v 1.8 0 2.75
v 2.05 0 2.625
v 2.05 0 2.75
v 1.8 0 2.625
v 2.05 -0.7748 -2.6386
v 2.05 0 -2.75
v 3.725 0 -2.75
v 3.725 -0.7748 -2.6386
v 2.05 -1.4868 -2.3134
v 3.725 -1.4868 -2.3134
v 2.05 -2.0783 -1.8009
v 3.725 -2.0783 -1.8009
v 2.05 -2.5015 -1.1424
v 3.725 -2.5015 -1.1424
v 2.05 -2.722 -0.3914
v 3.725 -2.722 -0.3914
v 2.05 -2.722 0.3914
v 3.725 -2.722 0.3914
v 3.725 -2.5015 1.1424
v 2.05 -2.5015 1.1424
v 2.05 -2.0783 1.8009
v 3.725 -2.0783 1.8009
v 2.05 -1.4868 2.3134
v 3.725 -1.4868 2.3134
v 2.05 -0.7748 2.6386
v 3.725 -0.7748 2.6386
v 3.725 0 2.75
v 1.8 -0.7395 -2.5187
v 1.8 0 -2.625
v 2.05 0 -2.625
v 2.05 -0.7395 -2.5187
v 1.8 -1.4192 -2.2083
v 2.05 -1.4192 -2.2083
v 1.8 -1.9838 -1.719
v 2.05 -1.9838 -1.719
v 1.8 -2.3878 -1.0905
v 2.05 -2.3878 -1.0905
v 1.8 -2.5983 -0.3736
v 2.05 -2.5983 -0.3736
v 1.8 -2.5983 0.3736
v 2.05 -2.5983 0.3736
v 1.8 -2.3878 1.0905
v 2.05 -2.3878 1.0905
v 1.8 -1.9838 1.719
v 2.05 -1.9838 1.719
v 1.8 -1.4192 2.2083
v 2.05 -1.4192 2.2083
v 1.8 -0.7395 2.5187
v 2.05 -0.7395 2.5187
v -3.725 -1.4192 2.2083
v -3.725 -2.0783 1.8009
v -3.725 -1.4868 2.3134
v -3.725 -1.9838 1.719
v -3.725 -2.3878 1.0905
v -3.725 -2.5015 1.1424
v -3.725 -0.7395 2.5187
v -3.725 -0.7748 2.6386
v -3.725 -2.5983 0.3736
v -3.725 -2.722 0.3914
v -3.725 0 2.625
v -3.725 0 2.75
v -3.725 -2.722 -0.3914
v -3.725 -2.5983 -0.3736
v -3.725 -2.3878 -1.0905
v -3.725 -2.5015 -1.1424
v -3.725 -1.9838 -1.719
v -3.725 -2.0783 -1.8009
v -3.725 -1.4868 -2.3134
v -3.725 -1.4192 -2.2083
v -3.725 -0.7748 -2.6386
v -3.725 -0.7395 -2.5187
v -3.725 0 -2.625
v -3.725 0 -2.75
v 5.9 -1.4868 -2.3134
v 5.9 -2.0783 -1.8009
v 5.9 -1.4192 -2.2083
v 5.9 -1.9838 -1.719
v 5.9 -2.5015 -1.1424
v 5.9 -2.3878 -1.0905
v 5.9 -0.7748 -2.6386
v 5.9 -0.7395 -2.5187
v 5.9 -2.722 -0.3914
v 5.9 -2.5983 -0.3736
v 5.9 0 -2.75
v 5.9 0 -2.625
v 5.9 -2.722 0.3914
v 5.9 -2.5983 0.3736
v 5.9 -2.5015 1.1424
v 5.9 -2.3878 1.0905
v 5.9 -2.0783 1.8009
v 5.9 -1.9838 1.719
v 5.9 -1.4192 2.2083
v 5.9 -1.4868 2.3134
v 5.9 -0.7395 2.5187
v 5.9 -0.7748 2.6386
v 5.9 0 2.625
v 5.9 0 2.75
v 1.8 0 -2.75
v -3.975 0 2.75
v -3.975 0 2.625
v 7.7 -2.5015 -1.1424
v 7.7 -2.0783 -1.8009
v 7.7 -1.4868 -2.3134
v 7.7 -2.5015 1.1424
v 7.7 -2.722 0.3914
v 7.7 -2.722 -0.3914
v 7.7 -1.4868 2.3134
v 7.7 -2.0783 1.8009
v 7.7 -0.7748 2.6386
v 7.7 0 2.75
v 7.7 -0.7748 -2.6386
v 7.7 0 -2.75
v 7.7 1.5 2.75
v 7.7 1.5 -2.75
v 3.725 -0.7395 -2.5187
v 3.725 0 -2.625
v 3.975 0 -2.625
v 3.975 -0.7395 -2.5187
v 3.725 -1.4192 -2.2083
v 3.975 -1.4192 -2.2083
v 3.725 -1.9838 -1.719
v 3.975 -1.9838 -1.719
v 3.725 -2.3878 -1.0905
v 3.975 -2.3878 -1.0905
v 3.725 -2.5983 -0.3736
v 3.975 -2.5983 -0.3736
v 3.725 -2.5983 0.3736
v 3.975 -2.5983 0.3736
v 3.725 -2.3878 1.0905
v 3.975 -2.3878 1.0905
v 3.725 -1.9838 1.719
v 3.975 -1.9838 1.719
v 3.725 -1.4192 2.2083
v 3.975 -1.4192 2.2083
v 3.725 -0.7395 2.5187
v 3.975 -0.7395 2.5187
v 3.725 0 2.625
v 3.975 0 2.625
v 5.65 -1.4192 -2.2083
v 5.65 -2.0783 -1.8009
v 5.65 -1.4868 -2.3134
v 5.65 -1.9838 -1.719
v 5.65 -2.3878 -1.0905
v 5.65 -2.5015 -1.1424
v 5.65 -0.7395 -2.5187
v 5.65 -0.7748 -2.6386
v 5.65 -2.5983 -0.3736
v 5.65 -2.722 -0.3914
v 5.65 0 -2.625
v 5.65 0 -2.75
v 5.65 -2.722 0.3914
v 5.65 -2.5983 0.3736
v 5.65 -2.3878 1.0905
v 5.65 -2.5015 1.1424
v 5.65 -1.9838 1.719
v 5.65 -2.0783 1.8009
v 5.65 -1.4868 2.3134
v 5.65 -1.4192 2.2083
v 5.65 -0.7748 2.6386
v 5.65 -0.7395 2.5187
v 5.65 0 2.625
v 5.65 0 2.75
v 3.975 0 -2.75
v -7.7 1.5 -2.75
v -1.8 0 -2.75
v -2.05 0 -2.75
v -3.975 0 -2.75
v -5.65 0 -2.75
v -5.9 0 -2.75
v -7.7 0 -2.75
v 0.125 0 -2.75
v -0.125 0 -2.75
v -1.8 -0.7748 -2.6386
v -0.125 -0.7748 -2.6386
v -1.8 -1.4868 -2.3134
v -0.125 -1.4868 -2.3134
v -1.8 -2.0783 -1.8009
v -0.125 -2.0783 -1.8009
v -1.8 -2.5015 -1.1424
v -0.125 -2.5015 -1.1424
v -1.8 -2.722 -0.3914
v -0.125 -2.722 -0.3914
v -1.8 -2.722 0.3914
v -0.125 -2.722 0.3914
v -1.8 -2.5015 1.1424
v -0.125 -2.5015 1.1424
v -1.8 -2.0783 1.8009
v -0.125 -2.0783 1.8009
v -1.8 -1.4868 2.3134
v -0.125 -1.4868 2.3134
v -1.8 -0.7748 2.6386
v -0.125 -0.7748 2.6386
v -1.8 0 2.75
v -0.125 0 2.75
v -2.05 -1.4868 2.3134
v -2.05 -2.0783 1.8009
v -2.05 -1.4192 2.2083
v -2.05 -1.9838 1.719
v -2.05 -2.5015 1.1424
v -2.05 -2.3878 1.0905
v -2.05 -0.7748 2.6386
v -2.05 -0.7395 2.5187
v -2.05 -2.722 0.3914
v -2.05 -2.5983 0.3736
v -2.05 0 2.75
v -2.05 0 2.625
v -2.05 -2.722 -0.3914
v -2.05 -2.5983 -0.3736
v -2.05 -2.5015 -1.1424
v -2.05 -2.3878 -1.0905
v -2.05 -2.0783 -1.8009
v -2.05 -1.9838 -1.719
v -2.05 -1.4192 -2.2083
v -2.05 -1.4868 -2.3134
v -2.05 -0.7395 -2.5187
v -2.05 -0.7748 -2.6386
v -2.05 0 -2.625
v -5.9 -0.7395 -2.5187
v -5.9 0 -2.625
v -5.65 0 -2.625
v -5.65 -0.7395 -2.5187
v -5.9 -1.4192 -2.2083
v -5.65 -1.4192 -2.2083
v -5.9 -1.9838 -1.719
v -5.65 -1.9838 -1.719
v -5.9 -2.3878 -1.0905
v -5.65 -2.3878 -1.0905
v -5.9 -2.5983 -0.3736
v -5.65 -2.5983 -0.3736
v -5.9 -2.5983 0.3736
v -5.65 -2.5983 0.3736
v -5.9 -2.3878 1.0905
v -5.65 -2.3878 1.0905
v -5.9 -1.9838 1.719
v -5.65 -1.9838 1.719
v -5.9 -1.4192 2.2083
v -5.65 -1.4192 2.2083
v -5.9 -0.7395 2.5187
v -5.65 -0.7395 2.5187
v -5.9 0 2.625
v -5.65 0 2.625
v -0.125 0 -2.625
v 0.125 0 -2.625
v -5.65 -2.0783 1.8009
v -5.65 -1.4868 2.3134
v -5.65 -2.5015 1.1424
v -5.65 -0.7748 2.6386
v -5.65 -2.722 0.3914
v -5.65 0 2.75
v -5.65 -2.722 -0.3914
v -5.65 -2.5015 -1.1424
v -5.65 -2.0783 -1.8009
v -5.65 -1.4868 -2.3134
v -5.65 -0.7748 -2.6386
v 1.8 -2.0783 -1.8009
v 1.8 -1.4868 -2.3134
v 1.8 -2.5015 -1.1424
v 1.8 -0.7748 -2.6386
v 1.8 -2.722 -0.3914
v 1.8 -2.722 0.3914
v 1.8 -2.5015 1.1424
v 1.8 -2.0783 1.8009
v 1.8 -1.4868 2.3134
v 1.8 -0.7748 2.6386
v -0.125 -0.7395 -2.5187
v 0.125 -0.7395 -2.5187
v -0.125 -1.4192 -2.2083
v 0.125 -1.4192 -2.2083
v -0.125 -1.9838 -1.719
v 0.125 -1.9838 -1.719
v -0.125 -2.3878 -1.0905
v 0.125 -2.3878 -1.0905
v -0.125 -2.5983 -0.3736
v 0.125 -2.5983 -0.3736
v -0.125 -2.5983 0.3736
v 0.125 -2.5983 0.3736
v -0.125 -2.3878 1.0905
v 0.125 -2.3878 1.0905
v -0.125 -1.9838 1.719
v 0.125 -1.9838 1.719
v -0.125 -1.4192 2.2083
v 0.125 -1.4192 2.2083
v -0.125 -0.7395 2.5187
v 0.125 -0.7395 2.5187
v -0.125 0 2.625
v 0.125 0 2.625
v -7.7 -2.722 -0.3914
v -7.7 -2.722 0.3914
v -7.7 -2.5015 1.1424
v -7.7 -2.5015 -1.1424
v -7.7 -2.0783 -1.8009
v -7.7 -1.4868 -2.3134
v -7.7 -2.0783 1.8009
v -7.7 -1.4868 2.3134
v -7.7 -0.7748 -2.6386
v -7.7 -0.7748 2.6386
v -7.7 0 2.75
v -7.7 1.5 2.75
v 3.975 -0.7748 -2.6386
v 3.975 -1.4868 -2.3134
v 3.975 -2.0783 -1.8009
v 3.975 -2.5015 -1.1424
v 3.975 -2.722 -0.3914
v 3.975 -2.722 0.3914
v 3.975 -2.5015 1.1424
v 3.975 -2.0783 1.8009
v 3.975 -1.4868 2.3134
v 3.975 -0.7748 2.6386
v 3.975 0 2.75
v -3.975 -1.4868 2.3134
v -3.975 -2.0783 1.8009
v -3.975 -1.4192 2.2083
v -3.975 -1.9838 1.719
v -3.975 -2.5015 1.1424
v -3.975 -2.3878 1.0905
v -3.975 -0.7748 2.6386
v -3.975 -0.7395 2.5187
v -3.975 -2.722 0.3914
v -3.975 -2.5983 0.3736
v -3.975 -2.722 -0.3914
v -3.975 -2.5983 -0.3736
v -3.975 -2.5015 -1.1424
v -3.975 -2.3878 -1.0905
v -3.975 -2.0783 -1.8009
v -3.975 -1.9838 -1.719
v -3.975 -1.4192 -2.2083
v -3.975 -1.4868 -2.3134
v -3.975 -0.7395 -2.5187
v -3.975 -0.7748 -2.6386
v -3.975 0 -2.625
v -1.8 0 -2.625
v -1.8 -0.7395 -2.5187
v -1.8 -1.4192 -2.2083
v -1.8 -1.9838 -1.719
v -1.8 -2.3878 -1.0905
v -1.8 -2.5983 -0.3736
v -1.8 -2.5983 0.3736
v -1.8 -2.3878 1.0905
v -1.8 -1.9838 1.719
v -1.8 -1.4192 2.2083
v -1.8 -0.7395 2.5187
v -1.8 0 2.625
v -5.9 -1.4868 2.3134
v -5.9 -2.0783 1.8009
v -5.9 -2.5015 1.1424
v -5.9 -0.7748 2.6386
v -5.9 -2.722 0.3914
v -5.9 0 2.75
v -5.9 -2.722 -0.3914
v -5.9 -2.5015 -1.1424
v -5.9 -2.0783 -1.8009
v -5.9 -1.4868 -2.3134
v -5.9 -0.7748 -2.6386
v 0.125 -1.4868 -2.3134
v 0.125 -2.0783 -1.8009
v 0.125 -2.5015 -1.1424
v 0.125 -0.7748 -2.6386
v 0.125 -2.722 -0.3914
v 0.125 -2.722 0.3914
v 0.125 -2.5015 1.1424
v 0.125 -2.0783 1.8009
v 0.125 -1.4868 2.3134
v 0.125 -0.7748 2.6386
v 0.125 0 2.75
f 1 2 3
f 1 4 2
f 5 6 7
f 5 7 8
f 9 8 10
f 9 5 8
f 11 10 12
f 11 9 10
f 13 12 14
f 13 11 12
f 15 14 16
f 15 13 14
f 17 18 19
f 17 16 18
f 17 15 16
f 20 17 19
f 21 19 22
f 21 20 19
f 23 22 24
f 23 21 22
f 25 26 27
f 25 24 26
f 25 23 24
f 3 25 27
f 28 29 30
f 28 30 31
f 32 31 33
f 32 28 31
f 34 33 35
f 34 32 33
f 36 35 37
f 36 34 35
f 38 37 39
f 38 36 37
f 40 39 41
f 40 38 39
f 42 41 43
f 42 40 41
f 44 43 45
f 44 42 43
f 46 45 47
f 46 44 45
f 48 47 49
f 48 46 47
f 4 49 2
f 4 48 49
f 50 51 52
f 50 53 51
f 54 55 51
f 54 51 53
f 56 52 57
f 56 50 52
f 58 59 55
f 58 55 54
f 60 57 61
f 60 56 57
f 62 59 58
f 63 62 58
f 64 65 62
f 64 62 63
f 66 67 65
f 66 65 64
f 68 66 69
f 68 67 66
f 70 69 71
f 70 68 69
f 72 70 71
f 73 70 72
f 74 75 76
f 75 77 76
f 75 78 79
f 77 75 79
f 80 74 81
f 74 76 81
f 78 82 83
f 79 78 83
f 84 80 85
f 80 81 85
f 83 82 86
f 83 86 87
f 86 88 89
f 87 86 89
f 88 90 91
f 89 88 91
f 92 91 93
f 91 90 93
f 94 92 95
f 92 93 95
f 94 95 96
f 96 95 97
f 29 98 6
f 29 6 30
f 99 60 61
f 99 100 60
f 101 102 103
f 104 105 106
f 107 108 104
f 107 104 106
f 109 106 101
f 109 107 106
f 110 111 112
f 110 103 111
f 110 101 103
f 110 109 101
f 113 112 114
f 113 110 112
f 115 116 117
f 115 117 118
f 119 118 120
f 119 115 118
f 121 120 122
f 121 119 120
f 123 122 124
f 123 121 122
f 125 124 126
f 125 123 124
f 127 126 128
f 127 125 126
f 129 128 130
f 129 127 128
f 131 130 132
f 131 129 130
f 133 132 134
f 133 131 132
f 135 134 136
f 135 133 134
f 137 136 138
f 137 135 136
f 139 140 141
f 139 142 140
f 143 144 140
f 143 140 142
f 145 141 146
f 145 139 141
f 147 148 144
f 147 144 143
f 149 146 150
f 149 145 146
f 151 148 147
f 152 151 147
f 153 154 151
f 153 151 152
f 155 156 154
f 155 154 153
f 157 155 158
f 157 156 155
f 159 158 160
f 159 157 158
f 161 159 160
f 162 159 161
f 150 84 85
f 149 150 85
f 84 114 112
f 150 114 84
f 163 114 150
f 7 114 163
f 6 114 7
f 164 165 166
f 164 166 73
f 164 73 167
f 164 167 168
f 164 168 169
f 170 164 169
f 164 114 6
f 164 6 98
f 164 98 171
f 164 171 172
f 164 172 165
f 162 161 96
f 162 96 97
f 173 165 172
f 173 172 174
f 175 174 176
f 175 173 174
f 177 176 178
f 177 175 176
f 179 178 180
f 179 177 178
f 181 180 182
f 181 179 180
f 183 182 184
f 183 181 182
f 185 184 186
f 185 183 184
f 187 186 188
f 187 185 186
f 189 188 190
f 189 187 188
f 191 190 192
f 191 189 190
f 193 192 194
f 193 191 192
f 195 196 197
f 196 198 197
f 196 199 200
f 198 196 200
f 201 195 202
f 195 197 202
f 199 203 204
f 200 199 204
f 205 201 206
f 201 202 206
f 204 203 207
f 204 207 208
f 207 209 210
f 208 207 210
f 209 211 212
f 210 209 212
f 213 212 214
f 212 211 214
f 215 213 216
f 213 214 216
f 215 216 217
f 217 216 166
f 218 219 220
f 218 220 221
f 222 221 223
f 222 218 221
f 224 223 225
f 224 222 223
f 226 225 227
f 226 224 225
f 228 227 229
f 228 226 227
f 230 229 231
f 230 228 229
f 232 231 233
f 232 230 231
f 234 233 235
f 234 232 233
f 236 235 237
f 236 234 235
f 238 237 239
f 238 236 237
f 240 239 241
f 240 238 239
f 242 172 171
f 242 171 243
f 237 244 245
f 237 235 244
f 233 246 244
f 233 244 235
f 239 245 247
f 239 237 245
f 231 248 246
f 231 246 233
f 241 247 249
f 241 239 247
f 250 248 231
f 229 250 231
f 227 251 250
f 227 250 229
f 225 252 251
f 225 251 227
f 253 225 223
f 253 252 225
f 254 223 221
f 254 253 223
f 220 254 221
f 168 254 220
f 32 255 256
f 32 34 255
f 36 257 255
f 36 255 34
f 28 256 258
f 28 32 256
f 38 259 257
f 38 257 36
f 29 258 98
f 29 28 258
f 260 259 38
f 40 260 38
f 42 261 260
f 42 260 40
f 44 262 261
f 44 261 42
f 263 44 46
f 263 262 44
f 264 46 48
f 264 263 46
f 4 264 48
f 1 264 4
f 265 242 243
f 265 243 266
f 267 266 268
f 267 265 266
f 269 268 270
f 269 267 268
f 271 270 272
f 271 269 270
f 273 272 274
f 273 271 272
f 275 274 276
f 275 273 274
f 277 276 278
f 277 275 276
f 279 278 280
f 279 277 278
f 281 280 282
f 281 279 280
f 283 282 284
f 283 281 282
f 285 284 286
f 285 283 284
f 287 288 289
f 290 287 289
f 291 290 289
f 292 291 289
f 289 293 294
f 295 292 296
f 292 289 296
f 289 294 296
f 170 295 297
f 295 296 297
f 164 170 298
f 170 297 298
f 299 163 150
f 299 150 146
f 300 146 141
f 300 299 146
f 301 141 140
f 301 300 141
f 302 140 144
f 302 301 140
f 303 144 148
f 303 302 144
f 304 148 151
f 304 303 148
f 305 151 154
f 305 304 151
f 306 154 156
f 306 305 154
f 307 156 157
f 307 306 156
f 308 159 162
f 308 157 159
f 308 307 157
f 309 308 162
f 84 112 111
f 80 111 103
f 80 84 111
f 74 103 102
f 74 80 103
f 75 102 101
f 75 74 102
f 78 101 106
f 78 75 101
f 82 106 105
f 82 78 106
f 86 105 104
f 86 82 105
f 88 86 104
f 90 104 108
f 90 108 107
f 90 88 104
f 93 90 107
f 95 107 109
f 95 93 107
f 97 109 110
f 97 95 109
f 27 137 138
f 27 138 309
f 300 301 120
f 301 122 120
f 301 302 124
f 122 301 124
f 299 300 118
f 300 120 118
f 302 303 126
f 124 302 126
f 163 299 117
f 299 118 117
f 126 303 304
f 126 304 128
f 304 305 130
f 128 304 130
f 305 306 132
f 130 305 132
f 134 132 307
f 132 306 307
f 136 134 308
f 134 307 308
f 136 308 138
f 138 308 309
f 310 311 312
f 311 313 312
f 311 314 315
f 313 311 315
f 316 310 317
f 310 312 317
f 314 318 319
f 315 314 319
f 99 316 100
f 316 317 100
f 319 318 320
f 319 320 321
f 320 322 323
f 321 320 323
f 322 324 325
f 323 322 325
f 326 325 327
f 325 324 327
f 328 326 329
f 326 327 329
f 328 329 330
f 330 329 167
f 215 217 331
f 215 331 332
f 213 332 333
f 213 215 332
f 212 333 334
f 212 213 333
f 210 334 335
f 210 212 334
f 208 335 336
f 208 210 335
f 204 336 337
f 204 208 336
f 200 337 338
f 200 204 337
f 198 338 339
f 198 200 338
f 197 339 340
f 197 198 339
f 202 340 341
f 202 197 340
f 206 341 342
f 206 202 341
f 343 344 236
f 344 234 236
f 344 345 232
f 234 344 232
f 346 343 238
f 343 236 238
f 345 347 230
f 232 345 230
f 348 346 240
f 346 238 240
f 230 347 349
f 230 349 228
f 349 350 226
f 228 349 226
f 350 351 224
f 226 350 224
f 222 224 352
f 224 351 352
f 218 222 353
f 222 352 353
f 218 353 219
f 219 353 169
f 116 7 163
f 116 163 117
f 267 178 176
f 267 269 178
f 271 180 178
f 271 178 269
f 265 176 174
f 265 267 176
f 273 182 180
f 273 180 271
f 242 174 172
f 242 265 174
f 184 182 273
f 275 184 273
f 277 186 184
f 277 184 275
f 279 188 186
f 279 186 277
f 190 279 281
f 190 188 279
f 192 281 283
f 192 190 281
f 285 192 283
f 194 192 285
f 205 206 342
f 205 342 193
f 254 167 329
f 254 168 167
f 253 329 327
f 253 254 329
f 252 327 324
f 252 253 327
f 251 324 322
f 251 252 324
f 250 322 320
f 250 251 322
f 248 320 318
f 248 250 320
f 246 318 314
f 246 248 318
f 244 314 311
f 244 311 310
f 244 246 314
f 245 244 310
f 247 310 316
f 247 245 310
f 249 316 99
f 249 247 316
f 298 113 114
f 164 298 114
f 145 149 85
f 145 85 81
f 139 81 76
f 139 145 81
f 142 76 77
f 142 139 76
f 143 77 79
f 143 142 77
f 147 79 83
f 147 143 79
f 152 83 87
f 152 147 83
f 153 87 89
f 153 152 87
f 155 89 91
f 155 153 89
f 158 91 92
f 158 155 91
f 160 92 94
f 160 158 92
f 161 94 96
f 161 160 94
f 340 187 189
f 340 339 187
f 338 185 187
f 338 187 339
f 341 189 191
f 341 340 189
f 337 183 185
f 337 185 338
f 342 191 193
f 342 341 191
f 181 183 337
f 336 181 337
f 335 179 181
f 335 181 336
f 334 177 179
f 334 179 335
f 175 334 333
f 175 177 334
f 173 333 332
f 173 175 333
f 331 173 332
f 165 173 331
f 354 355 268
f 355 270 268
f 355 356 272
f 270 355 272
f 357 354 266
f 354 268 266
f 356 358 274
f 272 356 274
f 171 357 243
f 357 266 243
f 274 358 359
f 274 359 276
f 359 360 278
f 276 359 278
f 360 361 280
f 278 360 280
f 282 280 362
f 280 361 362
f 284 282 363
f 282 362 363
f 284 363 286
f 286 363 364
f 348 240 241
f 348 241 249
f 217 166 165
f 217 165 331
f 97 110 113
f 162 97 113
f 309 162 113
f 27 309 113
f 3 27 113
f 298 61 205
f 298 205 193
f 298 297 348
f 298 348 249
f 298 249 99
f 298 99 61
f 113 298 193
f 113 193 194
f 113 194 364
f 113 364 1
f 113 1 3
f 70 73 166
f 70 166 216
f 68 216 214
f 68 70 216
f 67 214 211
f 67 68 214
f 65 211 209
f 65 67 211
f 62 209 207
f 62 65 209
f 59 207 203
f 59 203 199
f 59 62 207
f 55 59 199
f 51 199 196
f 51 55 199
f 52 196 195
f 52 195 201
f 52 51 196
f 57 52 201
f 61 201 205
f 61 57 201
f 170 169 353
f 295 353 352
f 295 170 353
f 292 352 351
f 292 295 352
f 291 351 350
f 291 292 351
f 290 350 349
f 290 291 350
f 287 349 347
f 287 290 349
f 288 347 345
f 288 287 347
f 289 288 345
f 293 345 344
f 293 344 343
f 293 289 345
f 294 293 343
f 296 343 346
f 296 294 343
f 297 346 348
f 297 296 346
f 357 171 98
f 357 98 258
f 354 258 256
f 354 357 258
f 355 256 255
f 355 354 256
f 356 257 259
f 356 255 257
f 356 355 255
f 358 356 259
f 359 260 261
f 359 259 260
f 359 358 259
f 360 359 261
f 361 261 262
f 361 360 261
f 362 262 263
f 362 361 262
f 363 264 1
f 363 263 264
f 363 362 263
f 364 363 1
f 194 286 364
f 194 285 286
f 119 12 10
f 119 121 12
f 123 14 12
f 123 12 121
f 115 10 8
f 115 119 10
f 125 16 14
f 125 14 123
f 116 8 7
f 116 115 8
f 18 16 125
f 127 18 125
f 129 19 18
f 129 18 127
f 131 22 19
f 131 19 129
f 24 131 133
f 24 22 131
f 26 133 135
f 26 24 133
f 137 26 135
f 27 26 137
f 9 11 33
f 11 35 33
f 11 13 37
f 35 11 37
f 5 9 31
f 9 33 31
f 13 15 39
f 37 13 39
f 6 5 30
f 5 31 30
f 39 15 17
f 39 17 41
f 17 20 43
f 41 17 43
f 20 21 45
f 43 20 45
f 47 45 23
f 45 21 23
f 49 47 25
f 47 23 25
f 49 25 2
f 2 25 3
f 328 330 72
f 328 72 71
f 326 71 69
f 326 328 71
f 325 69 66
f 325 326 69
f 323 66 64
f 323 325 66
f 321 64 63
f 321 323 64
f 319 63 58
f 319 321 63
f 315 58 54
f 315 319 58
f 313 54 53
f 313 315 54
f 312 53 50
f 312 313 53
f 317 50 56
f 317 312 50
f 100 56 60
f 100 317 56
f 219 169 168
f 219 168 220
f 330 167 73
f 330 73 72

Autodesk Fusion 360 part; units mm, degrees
sketch "Sketch1" plane through (0, 0, 0) normal (1, 0, 0) x (0, 1, 0)
  circle A0 centre (0, 0) radius 2.75
  line L0 (0, 0) -> (0, 2.75) construction
  line L1 (0, 0) -> (0, -2.75) construction
  line L2 (0, 2.75) -> (1.5, 2.75)
  line L3 (1.5, 2.75) -> (1.5, -2.75)
  line L4 (1.5, -2.75) -> (0, -2.75)
  line L5 (0, -2.75) -> (0, 2.75)
  dimension "d1" = 5.5
  dimension "d42" = 1.5
extrude "Extrude1" add sketch "Sketch1" along normal mid plane 15.4 contours A0 L5 | A0 L3 L5 | A0 L3
ref_plane "WorkPlane1" through (-7.5, 0, 0) normal (-1, 0, 0) x (0, -1, 0)
ref_plane "WorkPlane2" through (0, 0, 0) normal (1, 0, 0) x (0, 1, 0)
ref_plane "WorkPlane3" through (3.85, 0, 0) normal (1, 0, 0) x (0, 1, 0)
ref_plane "WorkPlane4" through (5.775, 0, 0) normal (1, 0, 0) x (0, 1, 0)
ref_plane "WorkPlane5" through (1.925, 0, 0) normal (1, 0, 0) x (0, 1, 0)
ref_plane "WorkPlane6" through (-3.85, 0, 0) normal (-1, 0, 0) x (0, -1, 0)
ref_plane "WorkPlane7" through (-5.775, 0, 0) normal (-1, 0, 0) x (0, -1, 0)
ref_plane "WorkPlane8" through (-1.925, 0, 0) normal (-1, 0, 0) x (0, -1, 0)
sketch "Sketch3" plane through (0, 0, 0) normal (1, 0, 0) x (0, 1, 0)
  circle A0 centre (0, 0) radius 2.75
  circle A1 centre (0, 0) radius 2.625
  dimension "d12" = 5.5
  dimension "d13" = 5.25
extrude "Extrude2" cut sketch "Sketch3" along normal mid plane 0.25
sketch "Sketch4" plane through (-7.5, 0, 0) normal (-1, 0, 0) x (0, 1, 0)
  circle A0 centre (0, 0) radius 2.75
  circle A1 centre (0, 0) radius 2.625
  dimension "d16" = 5.5
  dimension "d17" = 5.25
sketch "Sketch5" plane through (-1.925, 0, 0) normal (-1, 0, 0) x (0, 1, 0)
  circle A0 centre (0, 0) radius 2.75
  circle A1 centre (0, 0) radius 2.625
  dimension "d18" = 5.5
  dimension "d19" = 5.25
extrude "Extrude3" cut sketch "Sketch5" along normal mid plane 0.25
sketch "Sketch6" plane through (-3.85, 0, 0) normal (-1, 0, 0) x (0, 1, 0)
  circle A0 centre (0, 0) radius 2.75
  circle A1 centre (0, 0) radius 2.625
  dimension "d22" = 5.5
  dimension "d23" = 5.25
extrude "Extrude4" cut sketch "Sketch6" along normal mid plane 0.25
sketch "Sketch7" plane through (-5.775, 0, 0) normal (-1, 0, 0) x (0, 1, 0)
  circle A0 centre (0, 0) radius 2.75
  circle A1 centre (0, 0) radius 2.625
  dimension "d26" = 5.5
  dimension "d27" = 5.25
extrude "Extrude5" cut sketch "Sketch7" along normal mid plane 0.25
sketch "Sketch8" plane through (1.925, 0, 0) normal (1, 0, 0) x (0, 1, 0)
  circle A0 centre (0, 0) radius 2.75
  circle A1 centre (0, 0) radius 2.625
  dimension "d30" = 5.5
  dimension "d31" = 5.25
extrude "Extrude6" cut sketch "Sketch8" along normal mid plane 0.25
sketch "Sketch9" plane through (3.85, 0, 0) normal (1, 0, 0) x (0, 1, 0)
  circle A0 centre (0, 0) radius 2.75
  circle A1 centre (0, 0) radius 2.625
  dimension "d34" = 5.5
  dimension "d35" = 5.25
extrude "Extrude7" cut sketch "Sketch9" along normal mid plane 0.25
sketch "Sketch10" plane through (5.775, 0, 0) normal (1, 0, 0) x (0, 1, 0)
  circle A0 centre (0, 0) radius 2.75
  circle A1 centre (0, 0) radius 2.625
  dimension "d38" = 5.5
  dimension "d39" = 5.25
extrude "Extrude8" cut sketch "Sketch10" along normal mid plane 0.25
extrude "Extrude9" add sketch "Sketch1" along normal mid plane 15.4 contours A0 L2 L3 | A0 L3 L5 | A0 L3 L4
extrude "Extrude10" cut sketch "Sketch1" along normal mid plane 20 contours A0 L3
